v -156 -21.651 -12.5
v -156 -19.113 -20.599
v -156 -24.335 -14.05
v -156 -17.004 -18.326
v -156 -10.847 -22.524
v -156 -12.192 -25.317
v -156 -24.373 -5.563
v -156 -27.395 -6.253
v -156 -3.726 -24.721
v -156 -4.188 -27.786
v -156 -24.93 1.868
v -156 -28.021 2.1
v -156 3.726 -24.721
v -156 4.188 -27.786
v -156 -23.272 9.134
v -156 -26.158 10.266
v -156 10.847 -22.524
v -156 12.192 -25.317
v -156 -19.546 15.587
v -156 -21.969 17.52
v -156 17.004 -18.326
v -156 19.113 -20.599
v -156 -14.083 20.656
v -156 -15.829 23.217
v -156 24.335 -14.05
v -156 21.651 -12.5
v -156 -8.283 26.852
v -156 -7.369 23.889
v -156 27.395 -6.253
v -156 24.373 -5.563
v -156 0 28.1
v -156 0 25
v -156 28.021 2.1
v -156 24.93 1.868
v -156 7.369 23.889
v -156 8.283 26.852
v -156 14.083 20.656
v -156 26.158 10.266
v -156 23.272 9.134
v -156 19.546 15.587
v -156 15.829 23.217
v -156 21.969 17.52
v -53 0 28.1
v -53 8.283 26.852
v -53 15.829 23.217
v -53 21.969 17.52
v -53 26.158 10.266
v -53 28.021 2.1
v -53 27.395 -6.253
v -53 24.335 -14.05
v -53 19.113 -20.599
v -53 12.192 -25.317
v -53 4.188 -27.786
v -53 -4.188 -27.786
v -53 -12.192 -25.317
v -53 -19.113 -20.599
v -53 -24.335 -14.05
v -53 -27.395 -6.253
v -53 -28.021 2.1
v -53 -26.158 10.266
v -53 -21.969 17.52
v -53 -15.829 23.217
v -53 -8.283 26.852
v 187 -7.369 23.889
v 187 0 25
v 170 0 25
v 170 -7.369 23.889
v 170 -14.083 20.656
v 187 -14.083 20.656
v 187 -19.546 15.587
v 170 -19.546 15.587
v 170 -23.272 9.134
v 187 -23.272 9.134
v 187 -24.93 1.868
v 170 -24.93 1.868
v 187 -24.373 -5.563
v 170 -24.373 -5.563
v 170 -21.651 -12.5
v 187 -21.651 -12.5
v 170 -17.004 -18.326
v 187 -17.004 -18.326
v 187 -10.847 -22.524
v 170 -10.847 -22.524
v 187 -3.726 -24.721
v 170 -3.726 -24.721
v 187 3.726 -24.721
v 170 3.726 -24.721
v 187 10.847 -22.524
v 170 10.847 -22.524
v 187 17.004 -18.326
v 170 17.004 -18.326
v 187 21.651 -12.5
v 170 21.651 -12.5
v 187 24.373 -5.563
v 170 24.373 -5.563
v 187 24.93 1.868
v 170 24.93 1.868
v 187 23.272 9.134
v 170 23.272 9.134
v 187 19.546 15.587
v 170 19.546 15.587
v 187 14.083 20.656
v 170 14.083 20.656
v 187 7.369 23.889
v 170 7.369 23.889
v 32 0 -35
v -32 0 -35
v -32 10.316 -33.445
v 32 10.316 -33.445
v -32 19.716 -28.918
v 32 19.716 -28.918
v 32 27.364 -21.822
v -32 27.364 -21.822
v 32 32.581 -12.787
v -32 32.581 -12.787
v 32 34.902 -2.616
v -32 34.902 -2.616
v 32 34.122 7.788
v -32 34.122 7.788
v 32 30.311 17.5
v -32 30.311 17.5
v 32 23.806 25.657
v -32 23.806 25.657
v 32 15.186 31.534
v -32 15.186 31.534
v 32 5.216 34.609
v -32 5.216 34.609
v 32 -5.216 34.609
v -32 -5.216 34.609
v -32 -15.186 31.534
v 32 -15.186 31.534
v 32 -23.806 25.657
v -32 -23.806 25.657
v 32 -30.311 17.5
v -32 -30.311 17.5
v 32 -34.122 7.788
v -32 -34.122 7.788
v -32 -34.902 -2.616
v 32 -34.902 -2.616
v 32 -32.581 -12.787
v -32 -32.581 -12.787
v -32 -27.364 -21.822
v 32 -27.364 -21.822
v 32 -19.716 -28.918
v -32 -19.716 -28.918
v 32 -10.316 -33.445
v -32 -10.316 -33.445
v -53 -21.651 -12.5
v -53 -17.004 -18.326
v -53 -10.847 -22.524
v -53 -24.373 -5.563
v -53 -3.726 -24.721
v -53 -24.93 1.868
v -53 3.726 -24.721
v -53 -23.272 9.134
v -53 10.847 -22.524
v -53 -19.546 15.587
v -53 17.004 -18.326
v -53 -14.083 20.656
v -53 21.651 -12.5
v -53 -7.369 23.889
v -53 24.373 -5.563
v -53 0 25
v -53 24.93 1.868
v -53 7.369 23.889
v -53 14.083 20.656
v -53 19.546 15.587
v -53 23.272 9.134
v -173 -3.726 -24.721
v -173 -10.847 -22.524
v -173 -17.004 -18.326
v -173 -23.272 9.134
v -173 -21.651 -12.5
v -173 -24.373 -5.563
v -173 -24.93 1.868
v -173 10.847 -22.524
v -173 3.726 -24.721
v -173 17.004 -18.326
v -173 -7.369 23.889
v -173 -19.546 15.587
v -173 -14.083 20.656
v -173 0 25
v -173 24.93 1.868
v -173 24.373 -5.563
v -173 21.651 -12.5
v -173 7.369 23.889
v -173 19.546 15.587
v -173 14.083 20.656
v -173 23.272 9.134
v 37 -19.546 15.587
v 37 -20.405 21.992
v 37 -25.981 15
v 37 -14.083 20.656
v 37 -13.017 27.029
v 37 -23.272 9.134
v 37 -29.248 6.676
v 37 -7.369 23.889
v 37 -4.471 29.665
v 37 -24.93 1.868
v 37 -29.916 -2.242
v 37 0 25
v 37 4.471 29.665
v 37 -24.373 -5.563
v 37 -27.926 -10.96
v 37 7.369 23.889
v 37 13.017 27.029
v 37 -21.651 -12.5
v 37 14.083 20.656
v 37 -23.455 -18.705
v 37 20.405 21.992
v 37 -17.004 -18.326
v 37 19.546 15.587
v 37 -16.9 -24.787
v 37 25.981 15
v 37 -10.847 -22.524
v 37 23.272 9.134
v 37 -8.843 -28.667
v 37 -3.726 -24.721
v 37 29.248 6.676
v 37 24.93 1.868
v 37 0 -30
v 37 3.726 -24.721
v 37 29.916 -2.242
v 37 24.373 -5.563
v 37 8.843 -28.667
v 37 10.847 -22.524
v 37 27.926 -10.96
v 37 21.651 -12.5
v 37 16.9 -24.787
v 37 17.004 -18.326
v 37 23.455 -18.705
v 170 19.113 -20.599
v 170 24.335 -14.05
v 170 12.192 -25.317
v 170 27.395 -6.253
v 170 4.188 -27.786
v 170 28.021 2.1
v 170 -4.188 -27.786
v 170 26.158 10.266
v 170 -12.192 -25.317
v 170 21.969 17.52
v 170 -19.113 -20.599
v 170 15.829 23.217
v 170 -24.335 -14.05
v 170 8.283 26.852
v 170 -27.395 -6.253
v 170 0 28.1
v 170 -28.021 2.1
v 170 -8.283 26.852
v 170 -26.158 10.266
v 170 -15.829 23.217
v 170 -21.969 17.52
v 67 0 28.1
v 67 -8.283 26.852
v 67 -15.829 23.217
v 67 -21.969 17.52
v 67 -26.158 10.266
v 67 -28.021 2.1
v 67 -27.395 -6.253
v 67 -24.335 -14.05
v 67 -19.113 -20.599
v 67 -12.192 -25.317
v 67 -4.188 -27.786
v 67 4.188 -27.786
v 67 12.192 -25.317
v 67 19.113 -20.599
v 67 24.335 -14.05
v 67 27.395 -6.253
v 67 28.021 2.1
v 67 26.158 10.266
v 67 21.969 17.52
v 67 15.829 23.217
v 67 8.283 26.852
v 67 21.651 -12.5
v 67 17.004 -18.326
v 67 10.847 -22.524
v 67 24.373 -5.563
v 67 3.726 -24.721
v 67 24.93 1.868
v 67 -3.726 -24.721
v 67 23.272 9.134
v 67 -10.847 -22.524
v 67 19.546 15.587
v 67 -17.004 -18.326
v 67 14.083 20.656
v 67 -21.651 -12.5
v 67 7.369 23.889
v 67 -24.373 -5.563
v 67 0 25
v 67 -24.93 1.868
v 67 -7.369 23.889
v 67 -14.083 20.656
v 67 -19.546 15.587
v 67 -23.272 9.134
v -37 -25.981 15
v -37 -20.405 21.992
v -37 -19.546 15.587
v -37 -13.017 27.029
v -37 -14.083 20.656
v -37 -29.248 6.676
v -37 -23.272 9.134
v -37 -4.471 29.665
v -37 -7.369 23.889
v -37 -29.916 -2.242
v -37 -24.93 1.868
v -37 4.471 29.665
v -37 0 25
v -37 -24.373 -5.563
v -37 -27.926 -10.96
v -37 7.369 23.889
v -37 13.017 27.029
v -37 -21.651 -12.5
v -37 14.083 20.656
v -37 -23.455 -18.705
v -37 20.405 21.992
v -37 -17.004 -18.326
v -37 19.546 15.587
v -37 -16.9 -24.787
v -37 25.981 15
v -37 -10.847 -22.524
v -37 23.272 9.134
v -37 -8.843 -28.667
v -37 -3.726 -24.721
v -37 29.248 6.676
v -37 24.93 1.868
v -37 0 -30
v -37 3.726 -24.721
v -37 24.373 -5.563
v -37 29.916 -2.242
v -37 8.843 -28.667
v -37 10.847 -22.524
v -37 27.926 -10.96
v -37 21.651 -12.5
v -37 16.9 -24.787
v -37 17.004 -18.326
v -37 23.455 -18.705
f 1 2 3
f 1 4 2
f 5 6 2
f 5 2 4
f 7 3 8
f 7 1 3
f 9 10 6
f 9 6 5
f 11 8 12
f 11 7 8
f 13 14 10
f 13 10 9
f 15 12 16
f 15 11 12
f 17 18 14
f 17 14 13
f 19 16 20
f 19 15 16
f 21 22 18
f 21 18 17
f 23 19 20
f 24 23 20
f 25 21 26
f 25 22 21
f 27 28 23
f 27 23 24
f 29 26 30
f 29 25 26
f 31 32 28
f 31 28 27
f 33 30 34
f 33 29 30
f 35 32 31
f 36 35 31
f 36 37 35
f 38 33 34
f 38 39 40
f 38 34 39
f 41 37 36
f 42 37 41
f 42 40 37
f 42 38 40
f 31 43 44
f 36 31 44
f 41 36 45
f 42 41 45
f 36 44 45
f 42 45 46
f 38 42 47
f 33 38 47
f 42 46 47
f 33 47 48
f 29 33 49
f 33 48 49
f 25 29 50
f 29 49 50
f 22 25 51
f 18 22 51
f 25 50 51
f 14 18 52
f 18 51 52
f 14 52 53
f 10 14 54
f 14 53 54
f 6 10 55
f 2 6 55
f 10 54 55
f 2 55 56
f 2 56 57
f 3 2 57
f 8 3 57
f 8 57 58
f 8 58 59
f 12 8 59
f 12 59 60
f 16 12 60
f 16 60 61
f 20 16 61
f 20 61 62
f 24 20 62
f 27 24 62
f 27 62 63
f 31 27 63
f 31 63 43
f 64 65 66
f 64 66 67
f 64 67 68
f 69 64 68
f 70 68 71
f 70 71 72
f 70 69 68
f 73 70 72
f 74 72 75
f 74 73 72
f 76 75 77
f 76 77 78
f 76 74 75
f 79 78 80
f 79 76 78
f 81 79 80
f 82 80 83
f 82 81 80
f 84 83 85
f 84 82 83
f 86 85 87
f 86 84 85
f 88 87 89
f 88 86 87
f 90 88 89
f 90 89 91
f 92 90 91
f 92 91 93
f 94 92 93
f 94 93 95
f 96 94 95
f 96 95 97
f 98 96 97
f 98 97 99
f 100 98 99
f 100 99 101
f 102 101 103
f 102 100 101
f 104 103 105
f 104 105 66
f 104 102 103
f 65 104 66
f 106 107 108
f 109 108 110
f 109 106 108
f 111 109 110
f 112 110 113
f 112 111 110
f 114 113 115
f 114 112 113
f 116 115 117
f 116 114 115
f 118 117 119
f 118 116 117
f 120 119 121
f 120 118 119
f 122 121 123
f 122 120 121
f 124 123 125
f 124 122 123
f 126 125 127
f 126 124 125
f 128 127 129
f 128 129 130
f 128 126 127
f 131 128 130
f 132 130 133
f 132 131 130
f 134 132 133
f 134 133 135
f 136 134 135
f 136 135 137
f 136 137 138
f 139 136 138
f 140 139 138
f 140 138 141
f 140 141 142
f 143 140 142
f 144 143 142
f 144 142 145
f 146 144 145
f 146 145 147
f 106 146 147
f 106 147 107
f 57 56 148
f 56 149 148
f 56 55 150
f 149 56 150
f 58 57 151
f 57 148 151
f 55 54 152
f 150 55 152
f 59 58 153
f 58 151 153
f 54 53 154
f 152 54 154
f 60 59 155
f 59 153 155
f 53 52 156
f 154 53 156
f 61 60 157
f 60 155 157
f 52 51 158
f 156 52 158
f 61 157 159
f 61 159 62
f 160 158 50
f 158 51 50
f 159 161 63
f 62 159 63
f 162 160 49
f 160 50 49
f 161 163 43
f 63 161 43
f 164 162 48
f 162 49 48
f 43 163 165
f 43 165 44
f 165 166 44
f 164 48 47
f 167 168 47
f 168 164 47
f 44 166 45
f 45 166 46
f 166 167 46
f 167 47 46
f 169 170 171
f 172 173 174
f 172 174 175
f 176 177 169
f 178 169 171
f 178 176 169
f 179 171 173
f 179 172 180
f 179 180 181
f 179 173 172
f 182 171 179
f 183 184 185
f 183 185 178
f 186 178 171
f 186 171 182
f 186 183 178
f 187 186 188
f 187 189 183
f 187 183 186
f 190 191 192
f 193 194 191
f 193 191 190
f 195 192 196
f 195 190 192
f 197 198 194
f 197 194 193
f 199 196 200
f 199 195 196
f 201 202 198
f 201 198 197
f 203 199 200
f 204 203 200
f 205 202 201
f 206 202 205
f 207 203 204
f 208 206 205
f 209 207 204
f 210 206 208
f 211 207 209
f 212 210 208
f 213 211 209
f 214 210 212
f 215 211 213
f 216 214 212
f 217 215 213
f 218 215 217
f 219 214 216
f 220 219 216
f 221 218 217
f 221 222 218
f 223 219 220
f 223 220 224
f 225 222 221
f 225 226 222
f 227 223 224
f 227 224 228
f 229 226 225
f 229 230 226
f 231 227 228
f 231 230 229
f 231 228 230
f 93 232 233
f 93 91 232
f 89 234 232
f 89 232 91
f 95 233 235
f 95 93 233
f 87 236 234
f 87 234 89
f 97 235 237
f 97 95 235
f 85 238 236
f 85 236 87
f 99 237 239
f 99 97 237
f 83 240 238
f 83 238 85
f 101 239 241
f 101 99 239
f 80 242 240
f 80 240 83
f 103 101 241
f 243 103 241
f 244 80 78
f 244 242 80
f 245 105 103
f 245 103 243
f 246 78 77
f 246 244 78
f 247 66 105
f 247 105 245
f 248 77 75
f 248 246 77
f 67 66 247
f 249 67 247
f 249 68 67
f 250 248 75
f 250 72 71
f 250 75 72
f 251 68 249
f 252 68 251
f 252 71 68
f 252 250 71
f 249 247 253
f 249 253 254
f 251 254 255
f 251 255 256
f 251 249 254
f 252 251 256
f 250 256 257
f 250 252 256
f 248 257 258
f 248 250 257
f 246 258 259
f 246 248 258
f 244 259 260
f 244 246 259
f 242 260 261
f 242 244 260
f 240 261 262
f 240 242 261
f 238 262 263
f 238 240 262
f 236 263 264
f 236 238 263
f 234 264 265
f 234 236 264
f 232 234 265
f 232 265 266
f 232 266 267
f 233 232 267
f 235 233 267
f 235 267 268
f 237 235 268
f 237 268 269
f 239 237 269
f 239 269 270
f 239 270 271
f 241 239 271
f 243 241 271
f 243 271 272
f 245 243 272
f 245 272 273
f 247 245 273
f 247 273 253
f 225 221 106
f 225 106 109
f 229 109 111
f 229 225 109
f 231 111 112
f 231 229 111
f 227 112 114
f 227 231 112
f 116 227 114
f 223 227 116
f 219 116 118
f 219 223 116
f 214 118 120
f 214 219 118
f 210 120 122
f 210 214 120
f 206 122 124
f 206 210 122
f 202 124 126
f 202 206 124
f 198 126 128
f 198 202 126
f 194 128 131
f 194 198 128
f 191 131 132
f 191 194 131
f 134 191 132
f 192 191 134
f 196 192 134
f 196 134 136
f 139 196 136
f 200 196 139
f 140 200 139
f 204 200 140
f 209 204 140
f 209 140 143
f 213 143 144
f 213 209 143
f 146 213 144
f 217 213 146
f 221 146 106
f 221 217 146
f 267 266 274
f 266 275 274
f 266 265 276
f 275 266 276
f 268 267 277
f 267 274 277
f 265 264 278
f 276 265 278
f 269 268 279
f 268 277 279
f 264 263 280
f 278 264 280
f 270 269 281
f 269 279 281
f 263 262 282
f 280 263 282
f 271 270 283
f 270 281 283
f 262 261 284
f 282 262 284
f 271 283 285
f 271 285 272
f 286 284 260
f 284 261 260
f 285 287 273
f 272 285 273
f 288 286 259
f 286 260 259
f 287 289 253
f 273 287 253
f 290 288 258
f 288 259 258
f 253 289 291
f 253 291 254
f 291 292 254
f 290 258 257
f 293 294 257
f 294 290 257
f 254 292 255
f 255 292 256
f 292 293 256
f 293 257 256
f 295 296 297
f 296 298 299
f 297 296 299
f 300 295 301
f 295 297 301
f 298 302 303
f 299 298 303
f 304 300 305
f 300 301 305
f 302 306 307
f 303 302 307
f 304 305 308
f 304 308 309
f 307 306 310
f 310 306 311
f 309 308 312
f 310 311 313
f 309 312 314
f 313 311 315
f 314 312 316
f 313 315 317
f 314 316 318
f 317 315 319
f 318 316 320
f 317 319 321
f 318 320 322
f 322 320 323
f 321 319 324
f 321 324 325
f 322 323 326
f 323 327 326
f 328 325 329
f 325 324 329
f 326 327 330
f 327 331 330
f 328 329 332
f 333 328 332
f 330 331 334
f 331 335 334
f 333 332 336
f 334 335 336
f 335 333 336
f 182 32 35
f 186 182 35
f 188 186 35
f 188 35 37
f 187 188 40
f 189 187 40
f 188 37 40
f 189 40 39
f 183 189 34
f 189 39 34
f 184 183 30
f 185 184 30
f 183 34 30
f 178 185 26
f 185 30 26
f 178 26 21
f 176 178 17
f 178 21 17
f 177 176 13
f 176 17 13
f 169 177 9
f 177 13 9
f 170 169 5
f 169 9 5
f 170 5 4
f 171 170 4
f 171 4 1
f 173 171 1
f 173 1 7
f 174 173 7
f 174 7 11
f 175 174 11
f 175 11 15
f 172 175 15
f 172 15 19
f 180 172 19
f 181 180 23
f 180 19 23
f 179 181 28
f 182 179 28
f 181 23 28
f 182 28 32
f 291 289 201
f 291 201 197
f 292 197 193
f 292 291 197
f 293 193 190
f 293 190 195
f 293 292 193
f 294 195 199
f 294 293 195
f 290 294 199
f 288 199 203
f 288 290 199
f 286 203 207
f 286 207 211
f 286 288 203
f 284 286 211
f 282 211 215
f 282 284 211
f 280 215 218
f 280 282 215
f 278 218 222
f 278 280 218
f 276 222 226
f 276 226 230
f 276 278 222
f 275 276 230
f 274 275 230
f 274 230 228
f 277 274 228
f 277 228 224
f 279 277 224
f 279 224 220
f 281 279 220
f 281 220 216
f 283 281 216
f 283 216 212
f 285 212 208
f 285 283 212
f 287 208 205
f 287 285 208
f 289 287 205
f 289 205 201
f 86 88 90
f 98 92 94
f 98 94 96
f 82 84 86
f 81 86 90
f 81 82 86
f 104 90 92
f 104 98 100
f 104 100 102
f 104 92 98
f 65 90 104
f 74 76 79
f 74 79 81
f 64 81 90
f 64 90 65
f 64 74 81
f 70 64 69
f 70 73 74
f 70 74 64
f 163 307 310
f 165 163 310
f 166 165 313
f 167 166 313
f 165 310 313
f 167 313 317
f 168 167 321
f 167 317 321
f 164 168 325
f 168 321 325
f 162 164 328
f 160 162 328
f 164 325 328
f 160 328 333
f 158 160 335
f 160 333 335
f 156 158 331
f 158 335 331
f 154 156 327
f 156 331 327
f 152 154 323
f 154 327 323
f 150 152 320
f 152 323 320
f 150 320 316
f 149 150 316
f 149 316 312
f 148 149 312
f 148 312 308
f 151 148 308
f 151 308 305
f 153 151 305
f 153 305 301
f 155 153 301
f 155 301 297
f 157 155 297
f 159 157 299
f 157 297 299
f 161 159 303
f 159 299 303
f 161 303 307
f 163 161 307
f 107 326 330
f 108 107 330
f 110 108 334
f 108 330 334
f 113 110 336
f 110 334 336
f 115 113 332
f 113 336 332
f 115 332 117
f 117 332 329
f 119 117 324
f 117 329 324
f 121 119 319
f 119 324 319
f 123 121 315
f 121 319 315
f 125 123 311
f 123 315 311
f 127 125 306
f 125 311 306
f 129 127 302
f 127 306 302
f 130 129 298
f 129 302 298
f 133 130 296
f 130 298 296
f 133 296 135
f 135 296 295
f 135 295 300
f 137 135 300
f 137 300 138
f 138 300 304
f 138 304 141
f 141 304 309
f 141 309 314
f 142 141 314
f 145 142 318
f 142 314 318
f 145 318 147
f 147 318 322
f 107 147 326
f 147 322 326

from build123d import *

# Parameters (mm, degrees)
CROQUIS1_R              = 35
SALIENTE_EXTRUIR1_DEPTH = 37
CHAFL_N1_SIZE           = 5
CROQUIS2_R              = 25
SALIENTE_EXTRUIR2_DEPTH = 16
CROQUIS3_R              = 28.1
SALIENTE_EXTRUIR3_DEPTH = 120
SALIENTE_EXTRUIR4_START = 30
CROQUIS4_R              = 25
SALIENTE_EXTRUIR4_DEPTH = 30
SALIENTE_EXTRUIR5_START = 120
CROQUIS5_R              = 28.1
SALIENTE_EXTRUIR5_DEPTH = 120
CORTAR_EXTRUIR1_START   = -17
CROQUIS6_R              = 28.1
CROQUIS6_R_2            = 25
CORTAR_EXTRUIR1_DEPTH   = 17
CROQUIS8_R              = 28.1
CROQUIS8_R_2            = 25
CORTAR_EXTRUIR2_DEPTH   = 17


with BuildPart() as part:
    # Croquis1 → Saliente-Extruir1 (new, symmetric)
    with BuildSketch(Plane(origin=(0, 0, 0), x_dir=(0, 0, -1), z_dir=(1, 0, 0))):
        Circle(CROQUIS1_R)
    extrude(amount=SALIENTE_EXTRUIR1_DEPTH, both=True)

    # Chaflán1
    chafl_n1_edges = [part.edges().sort_by_distance(p)[0] for p in [
        (-37, 0, 35),
        (37, 0, 35),
    ]]
    chamfer(chafl_n1_edges, length=CHAFL_N1_SIZE)

    # Croquis2 → Saliente-Extruir2 (add)
    with BuildSketch(Plane.ZY.offset(37)):
        Circle(CROQUIS2_R)
    extrude(amount=SALIENTE_EXTRUIR2_DEPTH)

    # Croquis3 → Saliente-Extruir3 (add)
    with BuildSketch(Plane.ZY.offset(53)):
        Circle(CROQUIS3_R)
    extrude(amount=SALIENTE_EXTRUIR3_DEPTH)

    # Croquis4 → Saliente-Extruir4 (add)
    with BuildSketch(Plane(origin=(37, 0, 0), x_dir=(0, 0, -1), z_dir=(1, 0, 0)).offset(SALIENTE_EXTRUIR4_START)):
        with Locations(Location((0, 0, 0), (0, 0, 180))):
            Circle(CROQUIS4_R)
    extrude(amount=-SALIENTE_EXTRUIR4_DEPTH)

    # Croquis5 → Saliente-Extruir5 (add)
    with BuildSketch(Plane(origin=(67, 0, 0), x_dir=(0, 0, -1), z_dir=(1, 0, 0)).offset(SALIENTE_EXTRUIR5_START)):
        with Locations(Location((0, 0, 0), (0, 0, 180))):
            Circle(CROQUIS5_R)
    extrude(amount=-SALIENTE_EXTRUIR5_DEPTH)

    # Croquis6 → Cortar-Extruir1 (cut)
    with BuildSketch(Plane.ZY.offset(173).offset(CORTAR_EXTRUIR1_START)):
        Circle(CROQUIS6_R)
        Circle(CROQUIS6_R_2, mode=Mode.SUBTRACT)
    extrude(amount=CORTAR_EXTRUIR1_DEPTH, mode=Mode.SUBTRACT)

    # Croquis8 → Cortar-Extruir2 (cut)
    with BuildSketch(Plane(origin=(187, 0, 0), x_dir=(0, 0, -1), z_dir=(1, 0, 0))):
        with Locations(Location((0, 0, 0), (0, 0, 180))):
            Circle(CROQUIS8_R)
        with Locations(Location((0, 0, 0), (0, 0, 180))):
            Circle(CROQUIS8_R_2, mode=Mode.SUBTRACT)
    extrude(amount=-CORTAR_EXTRUIR2_DEPTH, mode=Mode.SUBTRACT)


solid = part.part
